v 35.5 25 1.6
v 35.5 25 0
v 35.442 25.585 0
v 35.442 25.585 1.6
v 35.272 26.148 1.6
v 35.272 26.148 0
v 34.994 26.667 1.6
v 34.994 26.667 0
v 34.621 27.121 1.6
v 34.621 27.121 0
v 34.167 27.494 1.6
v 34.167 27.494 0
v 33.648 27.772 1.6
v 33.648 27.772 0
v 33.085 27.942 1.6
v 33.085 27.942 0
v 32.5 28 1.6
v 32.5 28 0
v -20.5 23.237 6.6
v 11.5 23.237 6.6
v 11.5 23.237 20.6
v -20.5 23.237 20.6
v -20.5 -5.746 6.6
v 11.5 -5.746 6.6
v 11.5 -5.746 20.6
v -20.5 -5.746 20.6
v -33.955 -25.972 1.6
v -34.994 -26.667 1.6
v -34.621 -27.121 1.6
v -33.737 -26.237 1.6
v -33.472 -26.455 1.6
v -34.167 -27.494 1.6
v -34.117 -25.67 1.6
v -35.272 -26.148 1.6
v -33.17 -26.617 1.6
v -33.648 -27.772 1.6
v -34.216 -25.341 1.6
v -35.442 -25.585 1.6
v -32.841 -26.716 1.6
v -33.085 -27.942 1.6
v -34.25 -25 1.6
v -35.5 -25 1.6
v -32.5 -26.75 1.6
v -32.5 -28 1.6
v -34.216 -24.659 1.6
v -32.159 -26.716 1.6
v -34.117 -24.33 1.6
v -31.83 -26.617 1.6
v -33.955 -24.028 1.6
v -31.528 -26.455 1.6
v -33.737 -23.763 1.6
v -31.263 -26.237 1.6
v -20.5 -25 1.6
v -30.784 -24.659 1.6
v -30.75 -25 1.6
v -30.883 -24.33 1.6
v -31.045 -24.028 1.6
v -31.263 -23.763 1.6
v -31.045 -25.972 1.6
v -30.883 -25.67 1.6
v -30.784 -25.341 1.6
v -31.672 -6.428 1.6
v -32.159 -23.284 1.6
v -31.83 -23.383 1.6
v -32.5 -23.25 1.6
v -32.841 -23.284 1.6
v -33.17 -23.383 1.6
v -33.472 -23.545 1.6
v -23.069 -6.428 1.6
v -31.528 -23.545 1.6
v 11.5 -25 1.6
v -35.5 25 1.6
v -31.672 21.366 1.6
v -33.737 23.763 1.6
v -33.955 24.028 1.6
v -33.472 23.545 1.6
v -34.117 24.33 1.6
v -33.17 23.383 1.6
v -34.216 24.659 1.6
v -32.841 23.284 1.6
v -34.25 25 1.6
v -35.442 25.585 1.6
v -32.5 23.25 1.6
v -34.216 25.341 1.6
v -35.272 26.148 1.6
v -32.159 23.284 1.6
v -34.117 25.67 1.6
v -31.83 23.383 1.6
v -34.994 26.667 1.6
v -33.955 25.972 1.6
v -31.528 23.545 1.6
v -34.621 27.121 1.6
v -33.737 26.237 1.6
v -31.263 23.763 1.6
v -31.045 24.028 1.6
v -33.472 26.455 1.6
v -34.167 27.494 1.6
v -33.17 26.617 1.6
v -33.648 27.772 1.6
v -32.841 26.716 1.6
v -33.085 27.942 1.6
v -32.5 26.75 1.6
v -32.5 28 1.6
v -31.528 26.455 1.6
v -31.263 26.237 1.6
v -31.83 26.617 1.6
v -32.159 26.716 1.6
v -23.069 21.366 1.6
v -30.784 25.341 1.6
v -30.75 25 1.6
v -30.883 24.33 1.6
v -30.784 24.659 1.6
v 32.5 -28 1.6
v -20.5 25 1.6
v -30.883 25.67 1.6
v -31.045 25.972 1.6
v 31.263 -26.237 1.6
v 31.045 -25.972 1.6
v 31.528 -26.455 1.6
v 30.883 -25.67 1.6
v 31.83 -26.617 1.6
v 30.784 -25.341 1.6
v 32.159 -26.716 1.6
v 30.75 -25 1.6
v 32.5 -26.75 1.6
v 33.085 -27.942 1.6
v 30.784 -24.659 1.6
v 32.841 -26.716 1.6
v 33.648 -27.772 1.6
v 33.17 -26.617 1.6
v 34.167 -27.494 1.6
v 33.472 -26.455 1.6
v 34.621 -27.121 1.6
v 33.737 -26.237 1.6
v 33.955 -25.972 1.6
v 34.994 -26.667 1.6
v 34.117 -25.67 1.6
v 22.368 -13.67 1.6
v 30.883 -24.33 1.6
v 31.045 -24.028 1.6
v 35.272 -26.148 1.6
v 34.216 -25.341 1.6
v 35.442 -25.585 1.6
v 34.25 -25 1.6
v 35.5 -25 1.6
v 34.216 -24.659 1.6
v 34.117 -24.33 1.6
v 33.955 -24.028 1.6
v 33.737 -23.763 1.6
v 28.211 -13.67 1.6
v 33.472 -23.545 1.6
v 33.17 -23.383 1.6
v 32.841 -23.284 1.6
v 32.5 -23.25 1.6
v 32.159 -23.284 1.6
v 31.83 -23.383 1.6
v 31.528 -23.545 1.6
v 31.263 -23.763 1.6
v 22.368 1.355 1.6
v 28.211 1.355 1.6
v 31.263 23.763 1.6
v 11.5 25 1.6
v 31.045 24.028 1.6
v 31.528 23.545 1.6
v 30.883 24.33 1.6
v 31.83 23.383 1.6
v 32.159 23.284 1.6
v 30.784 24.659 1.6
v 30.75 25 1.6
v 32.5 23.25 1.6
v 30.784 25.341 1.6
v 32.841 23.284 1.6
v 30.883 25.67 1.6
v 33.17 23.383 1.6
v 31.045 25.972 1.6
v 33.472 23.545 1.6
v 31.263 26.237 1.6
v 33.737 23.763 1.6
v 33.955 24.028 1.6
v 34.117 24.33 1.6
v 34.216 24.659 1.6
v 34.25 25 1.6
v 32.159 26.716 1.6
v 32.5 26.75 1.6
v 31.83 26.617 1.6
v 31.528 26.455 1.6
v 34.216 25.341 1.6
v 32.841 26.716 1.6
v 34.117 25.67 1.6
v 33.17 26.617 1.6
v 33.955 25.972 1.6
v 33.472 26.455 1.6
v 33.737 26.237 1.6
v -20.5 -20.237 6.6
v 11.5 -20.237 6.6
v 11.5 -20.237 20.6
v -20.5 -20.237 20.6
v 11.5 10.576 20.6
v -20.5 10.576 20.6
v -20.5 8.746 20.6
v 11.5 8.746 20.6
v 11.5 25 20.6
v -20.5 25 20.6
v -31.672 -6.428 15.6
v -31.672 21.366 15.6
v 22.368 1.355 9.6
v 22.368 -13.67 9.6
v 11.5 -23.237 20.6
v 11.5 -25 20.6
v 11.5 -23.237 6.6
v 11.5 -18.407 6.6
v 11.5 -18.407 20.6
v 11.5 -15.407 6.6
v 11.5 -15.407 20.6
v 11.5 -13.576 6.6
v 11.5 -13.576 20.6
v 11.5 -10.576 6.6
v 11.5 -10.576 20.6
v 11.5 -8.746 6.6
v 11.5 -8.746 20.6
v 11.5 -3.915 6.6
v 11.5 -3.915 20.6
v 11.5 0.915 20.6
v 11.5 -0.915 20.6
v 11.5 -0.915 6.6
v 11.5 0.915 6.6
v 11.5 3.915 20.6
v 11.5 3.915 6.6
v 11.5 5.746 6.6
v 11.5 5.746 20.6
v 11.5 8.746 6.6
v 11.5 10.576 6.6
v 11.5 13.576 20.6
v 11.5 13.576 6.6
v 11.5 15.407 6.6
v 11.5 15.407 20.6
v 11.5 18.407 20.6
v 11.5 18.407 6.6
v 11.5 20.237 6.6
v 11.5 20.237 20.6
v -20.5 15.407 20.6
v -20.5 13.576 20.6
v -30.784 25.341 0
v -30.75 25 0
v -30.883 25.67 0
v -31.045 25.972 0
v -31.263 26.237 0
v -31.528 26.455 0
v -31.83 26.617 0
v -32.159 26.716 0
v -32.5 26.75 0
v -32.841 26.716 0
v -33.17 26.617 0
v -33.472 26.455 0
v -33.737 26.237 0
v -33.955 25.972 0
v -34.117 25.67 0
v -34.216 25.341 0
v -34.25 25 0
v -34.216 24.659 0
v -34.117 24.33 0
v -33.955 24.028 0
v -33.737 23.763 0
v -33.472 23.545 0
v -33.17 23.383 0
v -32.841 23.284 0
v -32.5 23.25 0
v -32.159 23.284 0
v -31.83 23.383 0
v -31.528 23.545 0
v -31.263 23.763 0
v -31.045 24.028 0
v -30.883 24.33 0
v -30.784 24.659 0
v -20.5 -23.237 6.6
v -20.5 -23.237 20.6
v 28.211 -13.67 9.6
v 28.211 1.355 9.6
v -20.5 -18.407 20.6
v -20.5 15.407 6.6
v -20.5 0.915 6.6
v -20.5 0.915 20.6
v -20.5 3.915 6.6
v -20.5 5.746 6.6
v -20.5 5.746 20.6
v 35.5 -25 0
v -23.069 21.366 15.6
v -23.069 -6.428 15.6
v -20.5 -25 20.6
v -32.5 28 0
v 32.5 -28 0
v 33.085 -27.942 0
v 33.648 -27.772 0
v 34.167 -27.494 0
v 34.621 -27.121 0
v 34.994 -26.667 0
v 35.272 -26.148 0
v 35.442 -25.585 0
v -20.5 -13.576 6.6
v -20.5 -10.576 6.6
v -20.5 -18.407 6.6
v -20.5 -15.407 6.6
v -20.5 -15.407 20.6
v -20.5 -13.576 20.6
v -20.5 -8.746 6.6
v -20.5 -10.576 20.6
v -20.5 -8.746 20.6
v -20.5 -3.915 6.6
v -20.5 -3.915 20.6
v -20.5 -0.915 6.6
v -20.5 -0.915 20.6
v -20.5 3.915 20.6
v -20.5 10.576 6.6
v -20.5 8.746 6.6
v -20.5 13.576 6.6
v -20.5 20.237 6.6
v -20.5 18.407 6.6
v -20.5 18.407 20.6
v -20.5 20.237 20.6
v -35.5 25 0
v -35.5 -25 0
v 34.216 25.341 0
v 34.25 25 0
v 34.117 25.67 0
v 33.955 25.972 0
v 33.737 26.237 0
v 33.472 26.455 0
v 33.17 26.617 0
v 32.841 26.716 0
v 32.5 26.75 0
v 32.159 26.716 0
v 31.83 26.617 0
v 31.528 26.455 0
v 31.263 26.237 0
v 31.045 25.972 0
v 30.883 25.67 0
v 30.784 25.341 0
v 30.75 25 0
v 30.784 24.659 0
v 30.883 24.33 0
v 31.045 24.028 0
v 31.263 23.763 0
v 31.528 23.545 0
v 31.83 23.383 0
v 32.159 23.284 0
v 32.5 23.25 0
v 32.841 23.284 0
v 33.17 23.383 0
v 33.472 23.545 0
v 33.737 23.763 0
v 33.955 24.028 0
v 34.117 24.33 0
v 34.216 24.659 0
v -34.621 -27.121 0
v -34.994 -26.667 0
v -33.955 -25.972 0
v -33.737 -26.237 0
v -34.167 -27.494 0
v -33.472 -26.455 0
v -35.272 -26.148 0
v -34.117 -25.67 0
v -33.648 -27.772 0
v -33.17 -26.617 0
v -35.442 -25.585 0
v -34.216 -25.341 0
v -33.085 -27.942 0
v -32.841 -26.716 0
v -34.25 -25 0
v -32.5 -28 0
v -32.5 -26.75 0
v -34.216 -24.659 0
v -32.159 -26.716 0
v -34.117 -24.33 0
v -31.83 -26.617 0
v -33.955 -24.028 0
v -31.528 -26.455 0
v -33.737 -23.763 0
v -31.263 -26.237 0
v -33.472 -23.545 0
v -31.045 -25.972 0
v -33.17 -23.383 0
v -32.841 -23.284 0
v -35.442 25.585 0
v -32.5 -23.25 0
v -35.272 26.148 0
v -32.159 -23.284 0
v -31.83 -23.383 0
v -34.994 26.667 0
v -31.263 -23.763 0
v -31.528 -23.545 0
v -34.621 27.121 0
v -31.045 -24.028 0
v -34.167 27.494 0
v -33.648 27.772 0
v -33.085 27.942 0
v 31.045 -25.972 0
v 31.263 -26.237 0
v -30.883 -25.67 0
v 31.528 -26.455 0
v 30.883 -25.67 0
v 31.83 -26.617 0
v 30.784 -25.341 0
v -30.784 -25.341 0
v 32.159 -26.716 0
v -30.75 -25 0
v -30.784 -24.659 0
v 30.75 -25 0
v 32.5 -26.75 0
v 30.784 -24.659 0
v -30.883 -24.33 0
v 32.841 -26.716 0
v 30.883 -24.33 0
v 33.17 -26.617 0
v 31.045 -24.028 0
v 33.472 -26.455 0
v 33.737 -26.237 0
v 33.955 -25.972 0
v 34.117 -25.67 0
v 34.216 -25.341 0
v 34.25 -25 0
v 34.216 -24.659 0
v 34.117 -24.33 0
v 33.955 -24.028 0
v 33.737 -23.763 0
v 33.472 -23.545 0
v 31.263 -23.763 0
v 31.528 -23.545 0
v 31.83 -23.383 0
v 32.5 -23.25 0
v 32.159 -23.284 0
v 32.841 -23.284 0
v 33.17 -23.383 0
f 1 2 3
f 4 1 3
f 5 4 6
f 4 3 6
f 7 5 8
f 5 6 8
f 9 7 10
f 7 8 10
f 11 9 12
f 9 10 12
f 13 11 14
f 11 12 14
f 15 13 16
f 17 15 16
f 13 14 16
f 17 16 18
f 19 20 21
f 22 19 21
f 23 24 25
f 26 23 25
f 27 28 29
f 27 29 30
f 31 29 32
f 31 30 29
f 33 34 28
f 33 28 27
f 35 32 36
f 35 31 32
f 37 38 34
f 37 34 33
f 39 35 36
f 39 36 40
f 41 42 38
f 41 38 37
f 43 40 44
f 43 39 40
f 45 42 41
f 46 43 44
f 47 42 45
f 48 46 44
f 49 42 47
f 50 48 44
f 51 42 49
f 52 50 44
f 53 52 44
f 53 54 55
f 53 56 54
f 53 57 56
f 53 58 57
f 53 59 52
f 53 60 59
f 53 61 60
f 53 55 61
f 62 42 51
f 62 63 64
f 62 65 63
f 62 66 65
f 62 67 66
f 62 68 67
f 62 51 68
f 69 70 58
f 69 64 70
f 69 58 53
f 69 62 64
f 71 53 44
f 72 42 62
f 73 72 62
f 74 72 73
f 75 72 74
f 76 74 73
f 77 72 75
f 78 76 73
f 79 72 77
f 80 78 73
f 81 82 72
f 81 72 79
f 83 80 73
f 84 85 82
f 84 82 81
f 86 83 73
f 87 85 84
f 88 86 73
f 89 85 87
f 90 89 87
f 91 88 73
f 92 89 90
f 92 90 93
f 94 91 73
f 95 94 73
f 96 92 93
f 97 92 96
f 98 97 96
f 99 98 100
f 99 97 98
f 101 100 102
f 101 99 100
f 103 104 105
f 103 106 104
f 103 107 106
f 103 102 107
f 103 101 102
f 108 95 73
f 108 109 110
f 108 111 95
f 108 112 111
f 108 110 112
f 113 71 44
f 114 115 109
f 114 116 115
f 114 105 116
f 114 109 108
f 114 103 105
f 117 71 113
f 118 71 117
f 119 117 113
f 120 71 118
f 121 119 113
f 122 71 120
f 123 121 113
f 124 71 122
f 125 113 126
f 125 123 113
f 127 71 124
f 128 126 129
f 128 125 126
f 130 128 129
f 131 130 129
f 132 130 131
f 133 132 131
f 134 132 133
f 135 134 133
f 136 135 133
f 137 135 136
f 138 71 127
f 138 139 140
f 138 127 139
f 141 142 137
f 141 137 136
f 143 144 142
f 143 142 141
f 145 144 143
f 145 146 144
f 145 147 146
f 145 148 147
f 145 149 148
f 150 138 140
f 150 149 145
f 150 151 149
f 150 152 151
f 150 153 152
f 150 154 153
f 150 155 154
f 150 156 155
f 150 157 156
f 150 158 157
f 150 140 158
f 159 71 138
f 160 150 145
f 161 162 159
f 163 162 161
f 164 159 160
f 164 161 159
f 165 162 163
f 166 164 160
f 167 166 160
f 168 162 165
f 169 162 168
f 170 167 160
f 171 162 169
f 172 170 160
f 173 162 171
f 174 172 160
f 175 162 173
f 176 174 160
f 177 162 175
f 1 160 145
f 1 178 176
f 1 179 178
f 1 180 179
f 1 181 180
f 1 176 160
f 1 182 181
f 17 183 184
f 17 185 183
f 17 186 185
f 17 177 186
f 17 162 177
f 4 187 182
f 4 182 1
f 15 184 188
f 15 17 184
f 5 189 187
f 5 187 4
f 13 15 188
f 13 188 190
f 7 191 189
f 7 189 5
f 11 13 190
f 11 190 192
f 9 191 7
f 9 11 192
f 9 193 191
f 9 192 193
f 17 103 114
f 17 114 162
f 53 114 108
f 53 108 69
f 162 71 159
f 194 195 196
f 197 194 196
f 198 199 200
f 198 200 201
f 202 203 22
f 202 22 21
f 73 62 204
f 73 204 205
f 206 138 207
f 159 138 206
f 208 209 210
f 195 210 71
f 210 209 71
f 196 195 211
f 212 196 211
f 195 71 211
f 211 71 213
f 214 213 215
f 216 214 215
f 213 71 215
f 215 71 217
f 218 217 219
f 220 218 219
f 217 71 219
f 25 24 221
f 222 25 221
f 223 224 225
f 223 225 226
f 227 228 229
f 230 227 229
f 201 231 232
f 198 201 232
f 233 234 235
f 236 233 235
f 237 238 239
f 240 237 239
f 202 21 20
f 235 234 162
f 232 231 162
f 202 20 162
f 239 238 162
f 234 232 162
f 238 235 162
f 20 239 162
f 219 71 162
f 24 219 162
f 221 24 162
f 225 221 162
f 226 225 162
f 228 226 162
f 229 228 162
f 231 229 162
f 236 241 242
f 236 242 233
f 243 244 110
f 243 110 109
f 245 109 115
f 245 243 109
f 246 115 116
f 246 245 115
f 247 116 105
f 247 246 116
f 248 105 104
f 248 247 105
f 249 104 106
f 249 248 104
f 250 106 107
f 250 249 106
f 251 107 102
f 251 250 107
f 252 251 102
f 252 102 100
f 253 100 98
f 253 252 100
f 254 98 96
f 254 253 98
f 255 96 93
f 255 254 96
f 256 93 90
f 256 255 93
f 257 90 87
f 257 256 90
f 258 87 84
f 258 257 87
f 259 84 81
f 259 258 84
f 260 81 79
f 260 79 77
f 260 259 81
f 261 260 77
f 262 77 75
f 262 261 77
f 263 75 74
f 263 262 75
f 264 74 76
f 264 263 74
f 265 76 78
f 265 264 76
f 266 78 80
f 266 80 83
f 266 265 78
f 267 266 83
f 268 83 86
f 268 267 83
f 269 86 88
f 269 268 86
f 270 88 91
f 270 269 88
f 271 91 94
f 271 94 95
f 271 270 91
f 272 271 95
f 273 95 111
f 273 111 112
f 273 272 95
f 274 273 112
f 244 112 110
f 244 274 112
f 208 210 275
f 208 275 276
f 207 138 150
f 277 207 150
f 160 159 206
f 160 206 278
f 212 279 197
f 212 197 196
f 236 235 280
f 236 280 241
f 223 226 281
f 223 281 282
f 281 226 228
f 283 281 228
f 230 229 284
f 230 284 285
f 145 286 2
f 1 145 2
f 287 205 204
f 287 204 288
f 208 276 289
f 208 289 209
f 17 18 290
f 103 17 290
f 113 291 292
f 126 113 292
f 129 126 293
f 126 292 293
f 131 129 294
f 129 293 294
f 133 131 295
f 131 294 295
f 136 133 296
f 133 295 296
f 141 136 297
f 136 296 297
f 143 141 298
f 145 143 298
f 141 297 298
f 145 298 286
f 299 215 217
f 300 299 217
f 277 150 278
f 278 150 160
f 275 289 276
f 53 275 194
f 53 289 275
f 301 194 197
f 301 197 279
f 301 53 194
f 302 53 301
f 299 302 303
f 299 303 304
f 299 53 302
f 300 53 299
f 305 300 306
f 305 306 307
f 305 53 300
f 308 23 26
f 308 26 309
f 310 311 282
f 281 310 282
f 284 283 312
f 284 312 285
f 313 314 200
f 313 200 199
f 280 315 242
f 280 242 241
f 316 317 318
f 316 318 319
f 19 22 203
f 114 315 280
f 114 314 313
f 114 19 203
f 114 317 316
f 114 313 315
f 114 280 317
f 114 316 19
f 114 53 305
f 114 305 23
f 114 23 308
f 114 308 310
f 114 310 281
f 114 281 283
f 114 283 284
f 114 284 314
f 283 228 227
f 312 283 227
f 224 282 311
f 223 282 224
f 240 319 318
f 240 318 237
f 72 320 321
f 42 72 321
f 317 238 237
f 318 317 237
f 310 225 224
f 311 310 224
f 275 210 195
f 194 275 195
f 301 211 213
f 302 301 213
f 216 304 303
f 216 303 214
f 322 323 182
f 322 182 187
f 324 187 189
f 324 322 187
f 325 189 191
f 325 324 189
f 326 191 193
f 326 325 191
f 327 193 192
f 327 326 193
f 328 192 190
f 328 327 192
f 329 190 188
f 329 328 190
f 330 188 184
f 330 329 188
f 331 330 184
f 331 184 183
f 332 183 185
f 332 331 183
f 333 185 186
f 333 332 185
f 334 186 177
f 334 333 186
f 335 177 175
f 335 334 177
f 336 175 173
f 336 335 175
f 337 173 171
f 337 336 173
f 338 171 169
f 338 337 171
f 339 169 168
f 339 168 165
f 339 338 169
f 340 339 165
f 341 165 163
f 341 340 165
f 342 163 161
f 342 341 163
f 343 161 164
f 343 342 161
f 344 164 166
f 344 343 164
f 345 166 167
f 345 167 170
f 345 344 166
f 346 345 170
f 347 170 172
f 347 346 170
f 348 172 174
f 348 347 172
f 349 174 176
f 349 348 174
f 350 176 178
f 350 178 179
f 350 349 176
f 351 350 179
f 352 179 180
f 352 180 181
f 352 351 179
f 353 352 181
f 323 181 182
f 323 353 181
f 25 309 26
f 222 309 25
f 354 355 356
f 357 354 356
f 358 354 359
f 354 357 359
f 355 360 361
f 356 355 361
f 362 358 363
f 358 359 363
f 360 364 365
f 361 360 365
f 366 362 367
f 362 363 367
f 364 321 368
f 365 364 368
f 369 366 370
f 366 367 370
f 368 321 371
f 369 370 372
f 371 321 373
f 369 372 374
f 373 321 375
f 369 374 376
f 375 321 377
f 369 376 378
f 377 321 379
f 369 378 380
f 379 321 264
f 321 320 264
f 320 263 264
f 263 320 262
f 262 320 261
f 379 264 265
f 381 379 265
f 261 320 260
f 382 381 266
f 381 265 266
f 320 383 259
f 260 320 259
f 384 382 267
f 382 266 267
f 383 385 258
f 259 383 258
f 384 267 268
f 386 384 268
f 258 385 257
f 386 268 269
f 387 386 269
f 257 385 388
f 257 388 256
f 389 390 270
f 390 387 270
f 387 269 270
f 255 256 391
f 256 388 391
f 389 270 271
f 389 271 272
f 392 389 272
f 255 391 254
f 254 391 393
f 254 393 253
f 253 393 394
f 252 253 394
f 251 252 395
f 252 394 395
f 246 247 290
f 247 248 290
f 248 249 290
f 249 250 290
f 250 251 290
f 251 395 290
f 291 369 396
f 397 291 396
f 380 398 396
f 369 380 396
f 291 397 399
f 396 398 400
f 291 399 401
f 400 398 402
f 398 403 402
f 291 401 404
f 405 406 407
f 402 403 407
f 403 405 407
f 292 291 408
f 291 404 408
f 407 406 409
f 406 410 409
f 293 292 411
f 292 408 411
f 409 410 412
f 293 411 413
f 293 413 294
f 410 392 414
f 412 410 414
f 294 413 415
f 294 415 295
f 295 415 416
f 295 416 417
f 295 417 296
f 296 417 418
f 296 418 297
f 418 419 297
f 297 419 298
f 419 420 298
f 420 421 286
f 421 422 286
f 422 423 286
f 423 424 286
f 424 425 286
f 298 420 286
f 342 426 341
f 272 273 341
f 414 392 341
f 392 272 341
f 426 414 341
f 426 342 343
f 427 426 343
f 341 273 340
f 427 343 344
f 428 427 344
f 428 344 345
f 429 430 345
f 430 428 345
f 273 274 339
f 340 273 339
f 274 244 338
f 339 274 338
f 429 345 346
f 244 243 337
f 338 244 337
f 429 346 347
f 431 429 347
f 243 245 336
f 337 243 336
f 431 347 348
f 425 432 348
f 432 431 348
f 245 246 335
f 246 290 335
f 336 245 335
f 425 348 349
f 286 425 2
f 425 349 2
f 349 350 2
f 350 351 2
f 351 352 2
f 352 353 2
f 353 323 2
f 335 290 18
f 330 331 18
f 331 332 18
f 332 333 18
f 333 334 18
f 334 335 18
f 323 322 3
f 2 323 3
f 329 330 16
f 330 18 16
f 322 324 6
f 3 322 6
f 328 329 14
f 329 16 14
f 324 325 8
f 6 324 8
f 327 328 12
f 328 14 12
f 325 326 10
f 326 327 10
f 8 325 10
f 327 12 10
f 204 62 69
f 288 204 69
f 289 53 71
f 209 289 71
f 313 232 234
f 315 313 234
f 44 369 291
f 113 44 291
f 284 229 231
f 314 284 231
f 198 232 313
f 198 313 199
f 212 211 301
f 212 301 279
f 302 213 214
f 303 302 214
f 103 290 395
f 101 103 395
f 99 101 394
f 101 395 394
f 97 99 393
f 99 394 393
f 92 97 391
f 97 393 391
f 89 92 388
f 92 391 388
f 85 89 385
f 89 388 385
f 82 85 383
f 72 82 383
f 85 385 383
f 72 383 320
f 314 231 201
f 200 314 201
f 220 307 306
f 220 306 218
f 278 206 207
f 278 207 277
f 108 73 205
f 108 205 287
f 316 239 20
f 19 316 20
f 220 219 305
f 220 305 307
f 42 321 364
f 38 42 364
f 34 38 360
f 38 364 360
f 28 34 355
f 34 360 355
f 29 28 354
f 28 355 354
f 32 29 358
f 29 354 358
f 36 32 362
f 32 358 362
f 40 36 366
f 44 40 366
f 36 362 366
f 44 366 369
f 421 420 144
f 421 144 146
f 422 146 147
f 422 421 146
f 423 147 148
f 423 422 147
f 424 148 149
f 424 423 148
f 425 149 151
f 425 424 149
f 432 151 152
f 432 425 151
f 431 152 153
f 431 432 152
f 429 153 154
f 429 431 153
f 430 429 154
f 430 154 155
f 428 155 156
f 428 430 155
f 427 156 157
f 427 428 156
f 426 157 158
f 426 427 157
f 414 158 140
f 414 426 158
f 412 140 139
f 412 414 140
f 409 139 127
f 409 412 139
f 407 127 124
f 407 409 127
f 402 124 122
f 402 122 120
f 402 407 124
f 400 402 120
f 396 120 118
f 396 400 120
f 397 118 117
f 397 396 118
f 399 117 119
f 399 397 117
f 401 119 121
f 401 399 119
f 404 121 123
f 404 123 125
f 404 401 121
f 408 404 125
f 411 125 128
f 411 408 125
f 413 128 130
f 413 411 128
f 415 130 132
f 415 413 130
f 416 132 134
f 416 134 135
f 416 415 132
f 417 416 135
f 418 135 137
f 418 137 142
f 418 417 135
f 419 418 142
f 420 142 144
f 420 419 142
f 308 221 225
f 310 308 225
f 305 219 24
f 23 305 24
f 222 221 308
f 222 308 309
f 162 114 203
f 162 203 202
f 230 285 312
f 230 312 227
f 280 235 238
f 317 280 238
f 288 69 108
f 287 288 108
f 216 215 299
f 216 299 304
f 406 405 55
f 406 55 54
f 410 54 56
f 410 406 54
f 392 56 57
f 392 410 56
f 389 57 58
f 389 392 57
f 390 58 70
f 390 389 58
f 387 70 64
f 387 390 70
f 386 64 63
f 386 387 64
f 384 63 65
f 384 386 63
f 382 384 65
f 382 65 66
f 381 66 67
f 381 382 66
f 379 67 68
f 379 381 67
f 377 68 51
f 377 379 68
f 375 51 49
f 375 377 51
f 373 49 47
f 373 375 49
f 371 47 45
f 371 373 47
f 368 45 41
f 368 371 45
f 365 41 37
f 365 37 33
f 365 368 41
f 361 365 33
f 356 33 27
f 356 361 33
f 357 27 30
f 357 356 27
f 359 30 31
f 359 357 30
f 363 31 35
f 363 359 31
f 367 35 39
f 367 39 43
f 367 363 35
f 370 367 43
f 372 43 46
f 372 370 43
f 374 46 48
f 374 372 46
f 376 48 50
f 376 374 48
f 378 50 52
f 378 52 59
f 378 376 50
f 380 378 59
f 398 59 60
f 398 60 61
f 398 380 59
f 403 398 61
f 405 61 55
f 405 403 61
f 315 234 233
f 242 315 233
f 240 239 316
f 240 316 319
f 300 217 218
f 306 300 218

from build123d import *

# Parameters (mm, degrees)
F0_R     = 1.75
F1_DEPTH = 1.6
F2_W     = 5.842995
F2_H     = 15.024841
F3_DEPTH = 8
F4_W     = 32
F4_H     = 50
F5_DEPTH = 19
F6_W     = 3
F6_H     = 14
F7_DEPTH = 32
F8_W     = 8.602944
F8_H     = 27.794118
F9_DEPTH = 14


with BuildPart() as f1:
    # F0 (on Top) → F1 (new body)
    with BuildSketch(Plane.XY):
        with BuildLine():
            ThreePointArc((35.5, 25), (34.62132, 27.12132), (32.5, 28))
            Line((32.5, 28), (-32.5, 28))
            ThreePointArc((-32.5, 28), (-34.62132, 27.12132), (-35.5, 25))
            Line((-35.5, 25), (-35.5, -25))
            ThreePointArc((-35.5, -25), (-34.62132, -27.12132), (-32.5, -28))
            Line((-32.5, -28), (32.5, -28))
            ThreePointArc((32.5, -28), (34.62132, -27.12132), (35.5, -25))
            Line((35.5, -25), (35.5, 25))
        make_face()
        with Locations((-32.5, -25)):
            Circle(F0_R, mode=Mode.SUBTRACT)
        with Locations((32.5, -25)):
            Circle(F0_R, mode=Mode.SUBTRACT)
        with Locations((-32.5, 25)):
            Circle(F0_R, mode=Mode.SUBTRACT)
        with Locations((32.5, 25)):
            Circle(F0_R, mode=Mode.SUBTRACT)
    extrude(amount=F1_DEPTH)

    # F2 (on face) → F3 (join)
    with BuildSketch(Plane.XY.offset(1.6)):
        with Locations((25.289628, -6.157123)):
            Rectangle(F2_W, F2_H)
    extrude(amount=F3_DEPTH)

    # F4 (on face) → F5 (join)
    with BuildSketch(Plane.XY.offset(1.6)):
        with Locations((-4.5, 0)):
            Rectangle(F4_W, F4_H)
    extrude(amount=F5_DEPTH)

    # F6 (on face) → F7 (cut, through all)
    with BuildSketch(Plane.YZ.offset(11.5)):
        with Locations((-21.737268, 13.6)):
            Rectangle(F6_W, F6_H)
        with Locations((-16.906764, 13.6)):
            Rectangle(F6_W, F6_H)
        with Locations((-12.07626, 13.6)):
            Rectangle(F6_W, F6_H)
        with Locations((-7.245756, 13.6)):
            Rectangle(F6_W, F6_H)
        with Locations((-2.415252, 13.6)):
            Rectangle(F6_W, F6_H)
        with Locations((2.415252, 13.6)):
            Rectangle(F6_W, F6_H)
        with Locations((7.245756, 13.6)):
            Rectangle(F6_W, F6_H)
        with Locations((12.07626, 13.6)):
            Rectangle(F6_W, F6_H)
        with Locations((16.906764, 13.6)):
            Rectangle(F6_W, F6_H)
        with Locations((21.737268, 13.6)):
            Rectangle(F6_W, F6_H)
    extrude(amount=-F7_DEPTH, mode=Mode.SUBTRACT)

    # F8 (on face) → F9 (join)
    with BuildSketch(Plane.XY.offset(1.6)):
        with Locations((-27.370911, 7.468621)):
            Rectangle(F8_W, F8_H)
    extrude(amount=F9_DEPTH)


solid = f1.part
